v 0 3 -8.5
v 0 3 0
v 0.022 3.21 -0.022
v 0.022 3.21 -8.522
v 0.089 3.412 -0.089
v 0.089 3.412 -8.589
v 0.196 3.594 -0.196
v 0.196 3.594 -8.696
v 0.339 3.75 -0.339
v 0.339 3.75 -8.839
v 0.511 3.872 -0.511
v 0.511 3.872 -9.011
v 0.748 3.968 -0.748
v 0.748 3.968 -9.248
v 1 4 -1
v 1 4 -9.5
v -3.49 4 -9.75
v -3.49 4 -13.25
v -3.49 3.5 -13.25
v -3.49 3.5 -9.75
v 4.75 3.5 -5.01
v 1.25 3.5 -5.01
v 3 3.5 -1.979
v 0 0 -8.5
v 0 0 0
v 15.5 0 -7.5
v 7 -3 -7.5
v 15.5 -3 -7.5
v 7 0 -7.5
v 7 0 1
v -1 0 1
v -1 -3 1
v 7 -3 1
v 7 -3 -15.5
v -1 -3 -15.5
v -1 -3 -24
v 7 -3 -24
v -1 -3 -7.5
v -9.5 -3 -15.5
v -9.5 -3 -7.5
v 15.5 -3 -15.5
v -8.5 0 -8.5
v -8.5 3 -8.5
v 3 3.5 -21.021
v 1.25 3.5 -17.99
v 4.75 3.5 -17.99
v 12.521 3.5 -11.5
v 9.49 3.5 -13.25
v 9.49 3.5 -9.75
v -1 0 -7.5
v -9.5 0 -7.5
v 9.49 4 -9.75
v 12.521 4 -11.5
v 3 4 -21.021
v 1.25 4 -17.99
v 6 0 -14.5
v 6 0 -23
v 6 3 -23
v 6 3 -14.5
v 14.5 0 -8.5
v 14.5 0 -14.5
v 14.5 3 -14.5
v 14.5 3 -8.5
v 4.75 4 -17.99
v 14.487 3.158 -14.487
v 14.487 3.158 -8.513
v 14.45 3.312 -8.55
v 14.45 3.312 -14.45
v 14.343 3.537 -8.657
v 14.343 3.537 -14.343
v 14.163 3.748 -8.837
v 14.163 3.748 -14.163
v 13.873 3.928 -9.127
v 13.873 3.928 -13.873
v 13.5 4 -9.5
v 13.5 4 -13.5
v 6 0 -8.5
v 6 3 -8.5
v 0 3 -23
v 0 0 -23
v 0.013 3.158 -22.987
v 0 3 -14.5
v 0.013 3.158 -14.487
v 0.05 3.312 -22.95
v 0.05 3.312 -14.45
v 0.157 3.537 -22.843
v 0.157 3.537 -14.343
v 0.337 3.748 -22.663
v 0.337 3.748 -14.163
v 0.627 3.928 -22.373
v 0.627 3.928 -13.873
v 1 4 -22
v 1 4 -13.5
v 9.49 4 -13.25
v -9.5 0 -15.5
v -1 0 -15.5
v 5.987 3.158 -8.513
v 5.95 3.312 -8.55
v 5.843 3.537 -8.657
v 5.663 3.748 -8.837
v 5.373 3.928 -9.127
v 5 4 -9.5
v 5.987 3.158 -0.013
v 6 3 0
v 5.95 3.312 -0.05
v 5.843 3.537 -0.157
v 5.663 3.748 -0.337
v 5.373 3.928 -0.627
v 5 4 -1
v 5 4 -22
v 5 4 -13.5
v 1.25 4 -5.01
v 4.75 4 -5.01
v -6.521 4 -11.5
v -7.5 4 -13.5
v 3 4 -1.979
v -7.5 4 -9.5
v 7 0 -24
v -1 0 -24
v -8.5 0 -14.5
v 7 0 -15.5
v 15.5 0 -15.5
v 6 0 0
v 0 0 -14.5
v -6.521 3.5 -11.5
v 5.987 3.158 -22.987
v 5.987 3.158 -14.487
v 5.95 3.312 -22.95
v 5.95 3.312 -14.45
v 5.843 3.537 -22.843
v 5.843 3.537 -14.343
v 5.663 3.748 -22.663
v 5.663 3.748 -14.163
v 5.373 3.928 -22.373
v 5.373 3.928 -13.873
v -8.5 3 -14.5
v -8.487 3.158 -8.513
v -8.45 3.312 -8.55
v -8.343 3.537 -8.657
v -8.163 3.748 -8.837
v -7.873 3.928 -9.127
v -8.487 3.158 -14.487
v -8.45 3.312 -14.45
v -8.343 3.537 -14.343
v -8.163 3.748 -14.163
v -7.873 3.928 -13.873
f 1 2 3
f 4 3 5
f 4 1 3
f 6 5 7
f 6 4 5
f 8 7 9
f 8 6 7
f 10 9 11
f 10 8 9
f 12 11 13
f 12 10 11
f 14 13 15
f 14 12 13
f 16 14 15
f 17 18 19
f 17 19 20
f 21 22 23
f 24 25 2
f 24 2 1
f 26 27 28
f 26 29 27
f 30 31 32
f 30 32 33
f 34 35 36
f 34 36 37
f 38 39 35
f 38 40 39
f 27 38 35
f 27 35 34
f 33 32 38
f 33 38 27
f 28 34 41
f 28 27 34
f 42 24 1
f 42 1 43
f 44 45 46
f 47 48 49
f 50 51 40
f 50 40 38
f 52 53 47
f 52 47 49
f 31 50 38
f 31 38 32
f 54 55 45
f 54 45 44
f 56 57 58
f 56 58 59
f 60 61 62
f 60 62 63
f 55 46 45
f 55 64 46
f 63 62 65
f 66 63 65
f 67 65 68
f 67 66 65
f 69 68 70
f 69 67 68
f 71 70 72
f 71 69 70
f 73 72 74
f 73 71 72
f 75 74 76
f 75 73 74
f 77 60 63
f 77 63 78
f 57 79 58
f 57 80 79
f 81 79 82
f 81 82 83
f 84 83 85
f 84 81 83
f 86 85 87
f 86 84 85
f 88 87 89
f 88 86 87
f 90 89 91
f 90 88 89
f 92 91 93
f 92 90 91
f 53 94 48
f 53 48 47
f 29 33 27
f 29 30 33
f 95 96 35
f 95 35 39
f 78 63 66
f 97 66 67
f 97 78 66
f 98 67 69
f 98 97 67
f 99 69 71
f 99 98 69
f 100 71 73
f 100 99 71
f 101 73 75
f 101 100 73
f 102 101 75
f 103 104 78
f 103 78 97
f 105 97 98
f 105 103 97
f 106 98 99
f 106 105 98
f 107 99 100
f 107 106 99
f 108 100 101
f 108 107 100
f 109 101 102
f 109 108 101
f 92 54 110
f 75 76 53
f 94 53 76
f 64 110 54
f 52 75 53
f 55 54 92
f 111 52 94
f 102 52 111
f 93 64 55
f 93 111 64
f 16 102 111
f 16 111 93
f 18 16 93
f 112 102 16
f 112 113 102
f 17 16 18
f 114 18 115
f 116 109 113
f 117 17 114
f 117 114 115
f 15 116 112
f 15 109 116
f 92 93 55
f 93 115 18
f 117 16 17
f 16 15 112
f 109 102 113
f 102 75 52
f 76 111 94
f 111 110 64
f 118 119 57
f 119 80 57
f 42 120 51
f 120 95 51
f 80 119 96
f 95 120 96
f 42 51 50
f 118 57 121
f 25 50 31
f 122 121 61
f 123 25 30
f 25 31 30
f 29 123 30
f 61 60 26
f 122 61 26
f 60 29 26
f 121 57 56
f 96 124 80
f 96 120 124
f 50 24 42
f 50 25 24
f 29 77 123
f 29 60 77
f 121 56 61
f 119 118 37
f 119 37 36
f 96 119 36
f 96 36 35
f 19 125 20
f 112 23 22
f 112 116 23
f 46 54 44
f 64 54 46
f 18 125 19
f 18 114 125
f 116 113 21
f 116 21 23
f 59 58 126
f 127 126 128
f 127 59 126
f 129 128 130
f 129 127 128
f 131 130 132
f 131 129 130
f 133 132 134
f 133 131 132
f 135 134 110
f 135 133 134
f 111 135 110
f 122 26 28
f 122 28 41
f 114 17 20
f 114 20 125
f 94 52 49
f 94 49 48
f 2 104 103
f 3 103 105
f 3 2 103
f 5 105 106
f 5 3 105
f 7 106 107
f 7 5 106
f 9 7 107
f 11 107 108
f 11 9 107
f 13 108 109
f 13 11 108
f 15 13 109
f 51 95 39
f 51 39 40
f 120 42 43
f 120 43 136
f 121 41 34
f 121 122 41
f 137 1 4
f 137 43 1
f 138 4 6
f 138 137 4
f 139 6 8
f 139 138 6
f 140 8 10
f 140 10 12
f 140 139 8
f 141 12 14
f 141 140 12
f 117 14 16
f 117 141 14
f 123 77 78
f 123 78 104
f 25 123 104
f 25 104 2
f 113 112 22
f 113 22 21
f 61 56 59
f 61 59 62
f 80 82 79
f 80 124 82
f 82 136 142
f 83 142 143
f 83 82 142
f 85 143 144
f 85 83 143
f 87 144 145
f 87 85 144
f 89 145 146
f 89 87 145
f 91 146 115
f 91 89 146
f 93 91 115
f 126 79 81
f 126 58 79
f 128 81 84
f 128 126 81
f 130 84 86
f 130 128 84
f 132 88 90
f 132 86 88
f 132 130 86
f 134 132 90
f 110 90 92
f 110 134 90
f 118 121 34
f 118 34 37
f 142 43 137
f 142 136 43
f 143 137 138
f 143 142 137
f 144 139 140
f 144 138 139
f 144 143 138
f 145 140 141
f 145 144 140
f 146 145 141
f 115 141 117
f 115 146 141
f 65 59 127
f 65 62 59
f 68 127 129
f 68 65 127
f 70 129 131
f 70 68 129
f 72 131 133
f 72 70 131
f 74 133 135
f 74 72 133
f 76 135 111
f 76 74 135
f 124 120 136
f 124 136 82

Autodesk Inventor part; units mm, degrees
ref_plane "YZ Plane" through (0, 0, 0) normal (1, 0, 0) x (0, 1, 0)
ref_plane "XZ Plane" through (0, 0, 0) normal (0, 1, 0) x (-1, 0, 0)
ref_plane "XY Plane" through (0, 0, 0) normal (0, 0, 1) x (1, 0, 0)
sketch "Skizze1" plane through (0, 0, 0) normal (0, 1, 0) x (-1, 0, 0)
  line L0 (0, 0) -> (0, -8.5)
  line L1 (0, -8.5) -> (8.5, -8.5)
  line L2 (8.5, -8.5) -> (8.5, -14.5)
  line L3 (8.5, -14.5) -> (0, -14.5)
  line L4 (0, -14.5) -> (0, -23)
  line L5 (0, -23) -> (-6, -23)
  line L6 (-6, -23) -> (-6, -14.5)
  line L7 (-6, -14.5) -> (-14.5, -14.5)
  line L8 (-14.5, -14.5) -> (-14.5, -8.5)
  line L9 (-14.5, -8.5) -> (-6, -8.5)
  line L10 (-6, 0) -> (0, 0)
  line L11 (-6, -8.5) -> (-6, 0)
  dimension "d0" = 23
  dimension "d1" = 23
  dimension "d2" = 6
  dimension "d3" = 6
  dimension "d4" = 8.5
  dimension "d5" = 8.5
  dimension "d6" = 8.5
extrude "Extrusion1" add sketch "Skizze1" along normal blind 4
sketch "Skizze2" plane through (0, 4, 0) normal (0, 1, 0) x (1, 0, 0)
  line L0 (3, 1.9793) -> (1.25, 5.0104)
  line L1 (1.25, 5.0104) -> (4.75, 5.0104)
  line L2 (4.75, 5.0104) -> (3, 1.9793)
  line L3 (6, 23) -> (0, 23) projected
  line L4 (0, 0) -> (6, 0) projected
  line L5 (3, 21.0207) -> (4.75, 17.9896)
  line L6 (4.75, 17.9896) -> (1.25, 17.9896)
  line L7 (1.25, 17.9896) -> (3, 21.0207)
  line L8 (-6.5207, 11.5) -> (-3.4896, 13.25)
  line L9 (-3.4896, 13.25) -> (-3.4896, 9.75)
  line L10 (-3.4896, 9.75) -> (-6.5207, 11.5)
  line L11 (12.5207, 11.5) -> (9.4896, 9.75)
  line L12 (9.4896, 9.75) -> (9.4896, 13.25)
  line L13 (9.4896, 13.25) -> (12.5207, 11.5)
  line L14 (-8.5, 14.5) -> (-8.5, 8.5) projected
  line L15 (14.5, 8.5) -> (14.5, 14.5) projected
  point P0 (3, 4)
  point P1 (3, 19)
  point P2 (-4.5, 11.5)
  point P3 (10.5, 11.5)
  dimension "d9" = 4
  dimension "d10" = 3
  dimension "d11" = 4
  dimension "d12" = 4
  dimension "d13" = 4
  dimension "d14" = 3
  dimension "d15" = 3
  dimension "d16" = 3
  dimension "d17" = 3.5
  dimension "d18" = 3.5
  dimension "d19" = 3.5
  dimension "d20" = 3.5
extrude "Extrusion2" cut sketch "Skizze2" against normal blind 0.5
fillet "Rundung1" radius 1 12 edges at (6, 4, -4.25) (3, 4, 0) (0, 4, -4.25) (10.25, 4, -8.5) (10.25, 4, -14.5) (14.5, 4, -11.5) (6, 4, -18.75) (3, 4, -23) (0, 4, -18.75) (-4.25, 4, -14.5) (-8.5, 4, -11.5) (-4.25, 4, -8.5)
sketch "Skizze3" plane through (0, 0, 0) normal (0, -1, 0) x (1, 0, 0)
  line L0 (15.5, -15.5) -> (7, -15.5)
  line L1 (7, -15.5) -> (7, -24)
  line L2 (7, -24) -> (-1, -24)
  line L3 (-1, -24) -> (-1, -15.5)
  line L4 (-1, -15.5) -> (-9.5, -15.5)
  line L5 (-9.5, -15.5) -> (-9.5, -7.5)
  line L6 (-9.5, -7.5) -> (-1, -7.5)
  line L7 (-1, -7.5) -> (-1, 1)
  line L8 (-1, 1) -> (7, 1)
  line L9 (7, 1) -> (7, -7.5)
  line L10 (14.5, -8.5) -> (6, -8.5) projected
  line L11 (7, -7.5) -> (15.5, -7.5)
  line L12 (15.5, -7.5) -> (15.5, -15.5)
  point P0 (0, 0)
  point P1 (14.5, -14.5)
  point P2 (6, -23)
  point P3 (-8.5, -8.5)
  point P4 (0, -8.5)
  point P5 (6, 0)
  dimension "d25" = 8.5
  dimension "d26" = 25
  dimension "d27" = 25
  dimension "d28" = 8
  dimension "d29" = 8
  dimension "d30" = 8
  dimension "d31" = 8
  dimension "d32" = 8.5
  dimension "d33" = 8.5
  dimension "d34" = 8.5
  dimension "d35" = 8.5
  dimension "d36" = 8.5
extrude "Extrusion3" add sketch "Skizze3" along normal blind 3
properties part number "Kreuz"
